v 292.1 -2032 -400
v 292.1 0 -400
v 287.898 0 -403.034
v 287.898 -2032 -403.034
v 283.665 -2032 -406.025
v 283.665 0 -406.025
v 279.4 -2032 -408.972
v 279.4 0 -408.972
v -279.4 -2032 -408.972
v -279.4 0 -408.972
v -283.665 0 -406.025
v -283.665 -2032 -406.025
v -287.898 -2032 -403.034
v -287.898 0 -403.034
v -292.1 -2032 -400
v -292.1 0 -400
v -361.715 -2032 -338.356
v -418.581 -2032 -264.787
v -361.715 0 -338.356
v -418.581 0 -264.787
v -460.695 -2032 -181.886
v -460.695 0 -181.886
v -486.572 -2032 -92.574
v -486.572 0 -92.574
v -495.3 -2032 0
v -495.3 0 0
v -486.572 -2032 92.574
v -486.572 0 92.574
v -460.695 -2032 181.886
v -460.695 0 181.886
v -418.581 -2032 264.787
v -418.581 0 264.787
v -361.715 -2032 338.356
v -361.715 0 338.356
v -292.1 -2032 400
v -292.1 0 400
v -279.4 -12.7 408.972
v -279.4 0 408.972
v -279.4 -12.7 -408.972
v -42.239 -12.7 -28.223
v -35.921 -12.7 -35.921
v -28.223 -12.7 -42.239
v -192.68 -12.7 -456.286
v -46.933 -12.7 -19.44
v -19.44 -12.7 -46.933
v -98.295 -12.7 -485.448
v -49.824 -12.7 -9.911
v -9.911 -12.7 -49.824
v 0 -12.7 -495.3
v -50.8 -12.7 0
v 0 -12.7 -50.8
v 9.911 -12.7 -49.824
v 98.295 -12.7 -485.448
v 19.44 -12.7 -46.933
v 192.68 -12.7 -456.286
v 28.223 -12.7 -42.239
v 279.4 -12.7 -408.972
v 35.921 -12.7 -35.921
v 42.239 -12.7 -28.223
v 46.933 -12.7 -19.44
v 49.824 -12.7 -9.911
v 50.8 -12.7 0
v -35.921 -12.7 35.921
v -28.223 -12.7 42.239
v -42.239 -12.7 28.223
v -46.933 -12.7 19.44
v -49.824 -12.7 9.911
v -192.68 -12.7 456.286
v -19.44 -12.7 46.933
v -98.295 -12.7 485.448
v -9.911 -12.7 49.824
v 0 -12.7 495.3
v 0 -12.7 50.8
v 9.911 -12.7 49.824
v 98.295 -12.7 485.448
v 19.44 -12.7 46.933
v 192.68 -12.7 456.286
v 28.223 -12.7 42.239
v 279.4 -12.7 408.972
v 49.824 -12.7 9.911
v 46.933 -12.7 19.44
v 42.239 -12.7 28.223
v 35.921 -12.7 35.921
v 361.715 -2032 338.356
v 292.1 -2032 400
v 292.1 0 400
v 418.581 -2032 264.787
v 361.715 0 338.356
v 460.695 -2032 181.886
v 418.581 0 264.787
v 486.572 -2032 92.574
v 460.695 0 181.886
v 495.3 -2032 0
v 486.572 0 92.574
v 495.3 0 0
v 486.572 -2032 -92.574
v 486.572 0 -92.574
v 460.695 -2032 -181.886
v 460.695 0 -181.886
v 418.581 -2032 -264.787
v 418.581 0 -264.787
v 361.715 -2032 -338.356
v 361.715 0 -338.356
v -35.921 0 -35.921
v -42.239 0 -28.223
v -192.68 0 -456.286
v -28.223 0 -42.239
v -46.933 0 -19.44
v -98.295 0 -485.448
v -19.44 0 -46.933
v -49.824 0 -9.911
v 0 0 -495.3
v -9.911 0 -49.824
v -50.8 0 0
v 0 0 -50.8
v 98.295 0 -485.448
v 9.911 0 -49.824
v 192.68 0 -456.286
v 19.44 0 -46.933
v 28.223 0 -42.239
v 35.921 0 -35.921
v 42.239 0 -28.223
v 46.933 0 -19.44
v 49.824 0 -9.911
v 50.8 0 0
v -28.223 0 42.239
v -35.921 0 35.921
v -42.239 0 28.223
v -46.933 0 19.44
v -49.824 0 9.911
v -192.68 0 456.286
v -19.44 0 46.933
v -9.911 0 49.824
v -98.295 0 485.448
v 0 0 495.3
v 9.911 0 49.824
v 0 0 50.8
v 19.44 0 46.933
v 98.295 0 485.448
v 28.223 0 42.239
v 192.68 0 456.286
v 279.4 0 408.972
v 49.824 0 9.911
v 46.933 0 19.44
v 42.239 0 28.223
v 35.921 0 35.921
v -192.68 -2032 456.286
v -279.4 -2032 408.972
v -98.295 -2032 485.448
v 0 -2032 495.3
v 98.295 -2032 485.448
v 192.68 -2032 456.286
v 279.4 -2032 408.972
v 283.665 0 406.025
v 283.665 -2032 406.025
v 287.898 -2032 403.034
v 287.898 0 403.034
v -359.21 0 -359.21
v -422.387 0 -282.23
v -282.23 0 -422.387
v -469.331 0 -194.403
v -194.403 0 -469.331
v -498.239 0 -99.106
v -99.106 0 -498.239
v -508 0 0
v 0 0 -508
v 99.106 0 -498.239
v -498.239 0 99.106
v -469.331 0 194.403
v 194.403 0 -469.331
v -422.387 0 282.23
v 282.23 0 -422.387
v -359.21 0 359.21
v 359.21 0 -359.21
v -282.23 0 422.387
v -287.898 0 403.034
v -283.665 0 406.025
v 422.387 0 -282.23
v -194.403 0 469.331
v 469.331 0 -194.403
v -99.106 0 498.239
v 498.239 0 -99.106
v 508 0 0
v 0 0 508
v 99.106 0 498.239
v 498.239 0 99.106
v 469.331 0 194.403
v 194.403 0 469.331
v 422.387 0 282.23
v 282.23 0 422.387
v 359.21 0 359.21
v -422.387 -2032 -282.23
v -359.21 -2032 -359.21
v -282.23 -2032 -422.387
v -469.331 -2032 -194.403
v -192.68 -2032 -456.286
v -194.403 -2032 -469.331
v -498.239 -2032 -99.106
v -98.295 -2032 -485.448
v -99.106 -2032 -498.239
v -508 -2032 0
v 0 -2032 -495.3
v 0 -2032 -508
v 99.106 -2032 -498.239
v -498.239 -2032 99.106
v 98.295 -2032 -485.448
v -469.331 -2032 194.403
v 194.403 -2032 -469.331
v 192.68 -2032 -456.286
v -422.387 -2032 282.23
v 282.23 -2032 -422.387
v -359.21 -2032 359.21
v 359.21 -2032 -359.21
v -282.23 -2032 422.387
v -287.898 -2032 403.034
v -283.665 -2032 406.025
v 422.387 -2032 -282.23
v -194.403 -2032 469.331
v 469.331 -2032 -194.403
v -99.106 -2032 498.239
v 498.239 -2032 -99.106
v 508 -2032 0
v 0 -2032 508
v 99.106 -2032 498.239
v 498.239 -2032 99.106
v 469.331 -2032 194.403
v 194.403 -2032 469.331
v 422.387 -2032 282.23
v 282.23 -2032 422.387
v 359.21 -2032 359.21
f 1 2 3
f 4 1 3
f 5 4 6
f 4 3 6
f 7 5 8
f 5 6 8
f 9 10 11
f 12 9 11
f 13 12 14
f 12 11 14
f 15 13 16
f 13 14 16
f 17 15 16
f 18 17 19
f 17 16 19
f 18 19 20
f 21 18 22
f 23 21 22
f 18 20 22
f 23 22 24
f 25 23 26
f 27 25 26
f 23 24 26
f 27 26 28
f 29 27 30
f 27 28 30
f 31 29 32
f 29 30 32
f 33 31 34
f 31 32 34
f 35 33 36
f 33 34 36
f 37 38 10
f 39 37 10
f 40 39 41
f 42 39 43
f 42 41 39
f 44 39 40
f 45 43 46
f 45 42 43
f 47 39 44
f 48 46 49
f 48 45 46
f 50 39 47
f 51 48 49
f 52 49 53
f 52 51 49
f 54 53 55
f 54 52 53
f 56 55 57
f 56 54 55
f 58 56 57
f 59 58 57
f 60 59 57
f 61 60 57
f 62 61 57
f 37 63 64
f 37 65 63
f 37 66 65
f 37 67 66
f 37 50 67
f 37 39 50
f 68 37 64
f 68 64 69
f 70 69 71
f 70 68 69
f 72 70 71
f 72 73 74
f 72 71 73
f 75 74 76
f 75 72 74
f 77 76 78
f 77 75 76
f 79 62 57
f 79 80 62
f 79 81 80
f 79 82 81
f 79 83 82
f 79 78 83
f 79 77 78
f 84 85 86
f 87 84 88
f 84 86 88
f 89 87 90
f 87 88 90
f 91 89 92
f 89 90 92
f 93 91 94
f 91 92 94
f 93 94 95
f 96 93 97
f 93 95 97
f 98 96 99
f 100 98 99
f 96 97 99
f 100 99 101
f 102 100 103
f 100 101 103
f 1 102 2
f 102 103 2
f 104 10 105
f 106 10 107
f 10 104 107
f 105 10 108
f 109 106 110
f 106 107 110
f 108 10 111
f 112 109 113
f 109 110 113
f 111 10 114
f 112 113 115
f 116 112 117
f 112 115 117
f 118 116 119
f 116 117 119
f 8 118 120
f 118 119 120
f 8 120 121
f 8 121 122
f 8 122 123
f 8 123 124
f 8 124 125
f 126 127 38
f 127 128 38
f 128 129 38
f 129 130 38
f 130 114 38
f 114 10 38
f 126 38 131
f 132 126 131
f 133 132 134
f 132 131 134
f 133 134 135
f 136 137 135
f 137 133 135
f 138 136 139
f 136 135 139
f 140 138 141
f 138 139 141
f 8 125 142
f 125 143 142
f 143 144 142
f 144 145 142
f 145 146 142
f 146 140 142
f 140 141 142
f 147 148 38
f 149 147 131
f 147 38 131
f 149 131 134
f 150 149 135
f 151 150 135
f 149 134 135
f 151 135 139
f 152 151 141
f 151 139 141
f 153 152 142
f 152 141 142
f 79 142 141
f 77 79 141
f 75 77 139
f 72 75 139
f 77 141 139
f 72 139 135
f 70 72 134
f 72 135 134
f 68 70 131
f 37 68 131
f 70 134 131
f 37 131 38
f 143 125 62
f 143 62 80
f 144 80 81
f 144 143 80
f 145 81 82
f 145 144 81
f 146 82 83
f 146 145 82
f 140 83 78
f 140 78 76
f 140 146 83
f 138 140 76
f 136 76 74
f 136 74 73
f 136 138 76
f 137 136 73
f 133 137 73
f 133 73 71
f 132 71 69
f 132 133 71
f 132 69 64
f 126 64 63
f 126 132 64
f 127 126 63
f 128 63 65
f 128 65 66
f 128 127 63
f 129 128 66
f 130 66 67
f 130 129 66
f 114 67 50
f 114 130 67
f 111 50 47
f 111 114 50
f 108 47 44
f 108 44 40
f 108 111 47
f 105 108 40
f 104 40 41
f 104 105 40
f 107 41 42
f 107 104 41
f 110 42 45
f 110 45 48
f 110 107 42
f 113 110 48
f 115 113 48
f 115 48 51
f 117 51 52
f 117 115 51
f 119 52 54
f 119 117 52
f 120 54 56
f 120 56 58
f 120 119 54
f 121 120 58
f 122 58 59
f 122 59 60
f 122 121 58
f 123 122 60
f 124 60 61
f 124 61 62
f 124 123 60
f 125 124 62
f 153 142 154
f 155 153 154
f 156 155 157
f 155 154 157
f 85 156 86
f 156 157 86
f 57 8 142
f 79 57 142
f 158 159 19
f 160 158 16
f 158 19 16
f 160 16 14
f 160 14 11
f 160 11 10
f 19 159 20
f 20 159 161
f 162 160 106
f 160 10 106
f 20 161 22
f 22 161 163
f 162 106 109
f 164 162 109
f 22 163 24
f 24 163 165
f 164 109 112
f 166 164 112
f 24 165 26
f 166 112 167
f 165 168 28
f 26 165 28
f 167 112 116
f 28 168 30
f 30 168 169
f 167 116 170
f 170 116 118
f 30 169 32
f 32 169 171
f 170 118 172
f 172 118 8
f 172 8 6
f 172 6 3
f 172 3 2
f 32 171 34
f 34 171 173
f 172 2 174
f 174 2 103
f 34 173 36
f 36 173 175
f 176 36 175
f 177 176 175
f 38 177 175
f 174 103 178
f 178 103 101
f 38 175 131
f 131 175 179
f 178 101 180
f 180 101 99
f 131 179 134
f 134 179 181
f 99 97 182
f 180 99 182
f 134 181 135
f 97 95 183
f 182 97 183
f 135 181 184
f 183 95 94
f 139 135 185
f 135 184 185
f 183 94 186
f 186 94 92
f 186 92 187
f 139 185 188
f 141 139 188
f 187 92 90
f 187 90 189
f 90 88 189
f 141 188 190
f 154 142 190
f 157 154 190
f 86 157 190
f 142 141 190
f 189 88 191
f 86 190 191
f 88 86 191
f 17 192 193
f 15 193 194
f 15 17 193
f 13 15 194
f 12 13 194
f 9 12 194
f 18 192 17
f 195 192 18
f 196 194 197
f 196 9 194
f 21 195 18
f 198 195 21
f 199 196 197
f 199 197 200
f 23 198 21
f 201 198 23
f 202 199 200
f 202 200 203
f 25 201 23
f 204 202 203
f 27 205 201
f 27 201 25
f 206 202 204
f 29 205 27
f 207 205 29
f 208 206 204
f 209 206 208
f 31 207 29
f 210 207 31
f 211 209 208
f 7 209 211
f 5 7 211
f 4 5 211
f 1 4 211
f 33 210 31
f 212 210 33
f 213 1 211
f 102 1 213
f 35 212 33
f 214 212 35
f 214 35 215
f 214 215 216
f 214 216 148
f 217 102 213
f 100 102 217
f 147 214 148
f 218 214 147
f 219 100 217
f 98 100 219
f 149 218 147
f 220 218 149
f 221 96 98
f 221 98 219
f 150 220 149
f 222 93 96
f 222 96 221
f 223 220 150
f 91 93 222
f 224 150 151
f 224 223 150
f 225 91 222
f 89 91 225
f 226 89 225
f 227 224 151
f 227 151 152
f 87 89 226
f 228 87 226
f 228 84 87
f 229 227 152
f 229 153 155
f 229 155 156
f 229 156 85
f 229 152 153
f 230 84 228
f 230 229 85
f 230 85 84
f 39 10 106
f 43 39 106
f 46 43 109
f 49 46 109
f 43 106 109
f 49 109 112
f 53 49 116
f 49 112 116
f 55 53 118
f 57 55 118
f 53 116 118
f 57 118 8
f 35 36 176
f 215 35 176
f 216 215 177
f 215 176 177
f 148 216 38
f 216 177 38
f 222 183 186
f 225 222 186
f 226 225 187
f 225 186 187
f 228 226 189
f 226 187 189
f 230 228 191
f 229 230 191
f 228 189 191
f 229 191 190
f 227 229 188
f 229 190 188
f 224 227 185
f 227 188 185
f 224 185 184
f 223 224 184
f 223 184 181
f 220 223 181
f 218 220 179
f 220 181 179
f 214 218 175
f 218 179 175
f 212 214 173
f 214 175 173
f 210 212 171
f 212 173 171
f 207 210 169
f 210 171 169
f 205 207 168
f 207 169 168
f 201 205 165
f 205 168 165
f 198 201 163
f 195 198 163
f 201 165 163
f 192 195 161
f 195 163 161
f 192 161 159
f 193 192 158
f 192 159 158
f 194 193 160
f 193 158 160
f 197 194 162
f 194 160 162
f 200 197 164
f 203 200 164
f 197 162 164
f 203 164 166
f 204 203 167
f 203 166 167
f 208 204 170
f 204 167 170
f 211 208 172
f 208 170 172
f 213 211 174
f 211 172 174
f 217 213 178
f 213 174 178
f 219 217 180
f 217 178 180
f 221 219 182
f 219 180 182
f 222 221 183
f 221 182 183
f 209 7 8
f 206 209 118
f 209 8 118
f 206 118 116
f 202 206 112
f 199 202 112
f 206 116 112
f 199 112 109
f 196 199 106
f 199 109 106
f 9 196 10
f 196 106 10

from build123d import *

# Parameters (mm, degrees)
F0_R     = 508
F1_DEPTH = 2032
F0_R_2   = 50.8
F2_DEPTH = 12.7
F3_DEPTH = 25.4


with BuildPart() as f1:
    # F0 (on Front) → F1 (new body)
    with BuildSketch(Plane.XZ):
        Circle(F0_R)
        with BuildLine():
            ThreePointArc((292.1, 399.9995999998), (441.5876017281, 224.3267260047), (495.3, 0))
            ThreePointArc((495.3, 0), (441.5876017281, -224.3267260047), (292.1, -399.9995999998))
            ThreePointArc((292.1, -399.9995999998), (285.785210392, -404.5354168935), (279.4, -408.9715515779))
            ThreePointArc((279.4, -408.9715515779), (0, -495.3), (-279.4, -408.9715515779))
            ThreePointArc((-279.4, -408.9715515779), (-285.785210392, -404.5354168935), (-292.1, -399.9995999998))
            ThreePointArc((-292.1, -399.9995999998), (-495.3, 0), (-292.1, 399.9995999998))
            ThreePointArc((-292.1, 399.9995999998), (-285.785210392, 404.5354168935), (-279.4, 408.9715515779))
            ThreePointArc((-279.4, 408.9715515779), (0, 495.3), (279.4, 408.9715515779))
            ThreePointArc((279.4, 408.9715515779), (285.785210392, 404.5354168935), (292.1, 399.9995999998))
        make_face(mode=Mode.SUBTRACT)
    extrude(amount=F1_DEPTH)

    # F0 (on Front) → F3 (cut)
    with BuildSketch(Plane.XZ):
        Circle(F0_R_2)
    extrude(amount=F3_DEPTH, mode=Mode.SUBTRACT)


with BuildPart() as f2:
    # F0 (on Front) → F2 (new body)
    with BuildSketch(Plane.XZ):
        with BuildLine():
            Line((279.4, -408.9715515779), (279.4, 408.9715515779))
            ThreePointArc((279.4, 408.9715515779), (0, 495.3), (-279.4, 408.9715515779))
            Line((-279.4, 408.9715515779), (-279.4, -408.9715515779))
            ThreePointArc((-279.4, -408.9715515779), (0, -495.3), (279.4, -408.9715515779))
        make_face()
        Circle(F0_R_2, mode=Mode.SUBTRACT)
    extrude(amount=F2_DEPTH)


solid = Compound([f1.part, f2.part])
